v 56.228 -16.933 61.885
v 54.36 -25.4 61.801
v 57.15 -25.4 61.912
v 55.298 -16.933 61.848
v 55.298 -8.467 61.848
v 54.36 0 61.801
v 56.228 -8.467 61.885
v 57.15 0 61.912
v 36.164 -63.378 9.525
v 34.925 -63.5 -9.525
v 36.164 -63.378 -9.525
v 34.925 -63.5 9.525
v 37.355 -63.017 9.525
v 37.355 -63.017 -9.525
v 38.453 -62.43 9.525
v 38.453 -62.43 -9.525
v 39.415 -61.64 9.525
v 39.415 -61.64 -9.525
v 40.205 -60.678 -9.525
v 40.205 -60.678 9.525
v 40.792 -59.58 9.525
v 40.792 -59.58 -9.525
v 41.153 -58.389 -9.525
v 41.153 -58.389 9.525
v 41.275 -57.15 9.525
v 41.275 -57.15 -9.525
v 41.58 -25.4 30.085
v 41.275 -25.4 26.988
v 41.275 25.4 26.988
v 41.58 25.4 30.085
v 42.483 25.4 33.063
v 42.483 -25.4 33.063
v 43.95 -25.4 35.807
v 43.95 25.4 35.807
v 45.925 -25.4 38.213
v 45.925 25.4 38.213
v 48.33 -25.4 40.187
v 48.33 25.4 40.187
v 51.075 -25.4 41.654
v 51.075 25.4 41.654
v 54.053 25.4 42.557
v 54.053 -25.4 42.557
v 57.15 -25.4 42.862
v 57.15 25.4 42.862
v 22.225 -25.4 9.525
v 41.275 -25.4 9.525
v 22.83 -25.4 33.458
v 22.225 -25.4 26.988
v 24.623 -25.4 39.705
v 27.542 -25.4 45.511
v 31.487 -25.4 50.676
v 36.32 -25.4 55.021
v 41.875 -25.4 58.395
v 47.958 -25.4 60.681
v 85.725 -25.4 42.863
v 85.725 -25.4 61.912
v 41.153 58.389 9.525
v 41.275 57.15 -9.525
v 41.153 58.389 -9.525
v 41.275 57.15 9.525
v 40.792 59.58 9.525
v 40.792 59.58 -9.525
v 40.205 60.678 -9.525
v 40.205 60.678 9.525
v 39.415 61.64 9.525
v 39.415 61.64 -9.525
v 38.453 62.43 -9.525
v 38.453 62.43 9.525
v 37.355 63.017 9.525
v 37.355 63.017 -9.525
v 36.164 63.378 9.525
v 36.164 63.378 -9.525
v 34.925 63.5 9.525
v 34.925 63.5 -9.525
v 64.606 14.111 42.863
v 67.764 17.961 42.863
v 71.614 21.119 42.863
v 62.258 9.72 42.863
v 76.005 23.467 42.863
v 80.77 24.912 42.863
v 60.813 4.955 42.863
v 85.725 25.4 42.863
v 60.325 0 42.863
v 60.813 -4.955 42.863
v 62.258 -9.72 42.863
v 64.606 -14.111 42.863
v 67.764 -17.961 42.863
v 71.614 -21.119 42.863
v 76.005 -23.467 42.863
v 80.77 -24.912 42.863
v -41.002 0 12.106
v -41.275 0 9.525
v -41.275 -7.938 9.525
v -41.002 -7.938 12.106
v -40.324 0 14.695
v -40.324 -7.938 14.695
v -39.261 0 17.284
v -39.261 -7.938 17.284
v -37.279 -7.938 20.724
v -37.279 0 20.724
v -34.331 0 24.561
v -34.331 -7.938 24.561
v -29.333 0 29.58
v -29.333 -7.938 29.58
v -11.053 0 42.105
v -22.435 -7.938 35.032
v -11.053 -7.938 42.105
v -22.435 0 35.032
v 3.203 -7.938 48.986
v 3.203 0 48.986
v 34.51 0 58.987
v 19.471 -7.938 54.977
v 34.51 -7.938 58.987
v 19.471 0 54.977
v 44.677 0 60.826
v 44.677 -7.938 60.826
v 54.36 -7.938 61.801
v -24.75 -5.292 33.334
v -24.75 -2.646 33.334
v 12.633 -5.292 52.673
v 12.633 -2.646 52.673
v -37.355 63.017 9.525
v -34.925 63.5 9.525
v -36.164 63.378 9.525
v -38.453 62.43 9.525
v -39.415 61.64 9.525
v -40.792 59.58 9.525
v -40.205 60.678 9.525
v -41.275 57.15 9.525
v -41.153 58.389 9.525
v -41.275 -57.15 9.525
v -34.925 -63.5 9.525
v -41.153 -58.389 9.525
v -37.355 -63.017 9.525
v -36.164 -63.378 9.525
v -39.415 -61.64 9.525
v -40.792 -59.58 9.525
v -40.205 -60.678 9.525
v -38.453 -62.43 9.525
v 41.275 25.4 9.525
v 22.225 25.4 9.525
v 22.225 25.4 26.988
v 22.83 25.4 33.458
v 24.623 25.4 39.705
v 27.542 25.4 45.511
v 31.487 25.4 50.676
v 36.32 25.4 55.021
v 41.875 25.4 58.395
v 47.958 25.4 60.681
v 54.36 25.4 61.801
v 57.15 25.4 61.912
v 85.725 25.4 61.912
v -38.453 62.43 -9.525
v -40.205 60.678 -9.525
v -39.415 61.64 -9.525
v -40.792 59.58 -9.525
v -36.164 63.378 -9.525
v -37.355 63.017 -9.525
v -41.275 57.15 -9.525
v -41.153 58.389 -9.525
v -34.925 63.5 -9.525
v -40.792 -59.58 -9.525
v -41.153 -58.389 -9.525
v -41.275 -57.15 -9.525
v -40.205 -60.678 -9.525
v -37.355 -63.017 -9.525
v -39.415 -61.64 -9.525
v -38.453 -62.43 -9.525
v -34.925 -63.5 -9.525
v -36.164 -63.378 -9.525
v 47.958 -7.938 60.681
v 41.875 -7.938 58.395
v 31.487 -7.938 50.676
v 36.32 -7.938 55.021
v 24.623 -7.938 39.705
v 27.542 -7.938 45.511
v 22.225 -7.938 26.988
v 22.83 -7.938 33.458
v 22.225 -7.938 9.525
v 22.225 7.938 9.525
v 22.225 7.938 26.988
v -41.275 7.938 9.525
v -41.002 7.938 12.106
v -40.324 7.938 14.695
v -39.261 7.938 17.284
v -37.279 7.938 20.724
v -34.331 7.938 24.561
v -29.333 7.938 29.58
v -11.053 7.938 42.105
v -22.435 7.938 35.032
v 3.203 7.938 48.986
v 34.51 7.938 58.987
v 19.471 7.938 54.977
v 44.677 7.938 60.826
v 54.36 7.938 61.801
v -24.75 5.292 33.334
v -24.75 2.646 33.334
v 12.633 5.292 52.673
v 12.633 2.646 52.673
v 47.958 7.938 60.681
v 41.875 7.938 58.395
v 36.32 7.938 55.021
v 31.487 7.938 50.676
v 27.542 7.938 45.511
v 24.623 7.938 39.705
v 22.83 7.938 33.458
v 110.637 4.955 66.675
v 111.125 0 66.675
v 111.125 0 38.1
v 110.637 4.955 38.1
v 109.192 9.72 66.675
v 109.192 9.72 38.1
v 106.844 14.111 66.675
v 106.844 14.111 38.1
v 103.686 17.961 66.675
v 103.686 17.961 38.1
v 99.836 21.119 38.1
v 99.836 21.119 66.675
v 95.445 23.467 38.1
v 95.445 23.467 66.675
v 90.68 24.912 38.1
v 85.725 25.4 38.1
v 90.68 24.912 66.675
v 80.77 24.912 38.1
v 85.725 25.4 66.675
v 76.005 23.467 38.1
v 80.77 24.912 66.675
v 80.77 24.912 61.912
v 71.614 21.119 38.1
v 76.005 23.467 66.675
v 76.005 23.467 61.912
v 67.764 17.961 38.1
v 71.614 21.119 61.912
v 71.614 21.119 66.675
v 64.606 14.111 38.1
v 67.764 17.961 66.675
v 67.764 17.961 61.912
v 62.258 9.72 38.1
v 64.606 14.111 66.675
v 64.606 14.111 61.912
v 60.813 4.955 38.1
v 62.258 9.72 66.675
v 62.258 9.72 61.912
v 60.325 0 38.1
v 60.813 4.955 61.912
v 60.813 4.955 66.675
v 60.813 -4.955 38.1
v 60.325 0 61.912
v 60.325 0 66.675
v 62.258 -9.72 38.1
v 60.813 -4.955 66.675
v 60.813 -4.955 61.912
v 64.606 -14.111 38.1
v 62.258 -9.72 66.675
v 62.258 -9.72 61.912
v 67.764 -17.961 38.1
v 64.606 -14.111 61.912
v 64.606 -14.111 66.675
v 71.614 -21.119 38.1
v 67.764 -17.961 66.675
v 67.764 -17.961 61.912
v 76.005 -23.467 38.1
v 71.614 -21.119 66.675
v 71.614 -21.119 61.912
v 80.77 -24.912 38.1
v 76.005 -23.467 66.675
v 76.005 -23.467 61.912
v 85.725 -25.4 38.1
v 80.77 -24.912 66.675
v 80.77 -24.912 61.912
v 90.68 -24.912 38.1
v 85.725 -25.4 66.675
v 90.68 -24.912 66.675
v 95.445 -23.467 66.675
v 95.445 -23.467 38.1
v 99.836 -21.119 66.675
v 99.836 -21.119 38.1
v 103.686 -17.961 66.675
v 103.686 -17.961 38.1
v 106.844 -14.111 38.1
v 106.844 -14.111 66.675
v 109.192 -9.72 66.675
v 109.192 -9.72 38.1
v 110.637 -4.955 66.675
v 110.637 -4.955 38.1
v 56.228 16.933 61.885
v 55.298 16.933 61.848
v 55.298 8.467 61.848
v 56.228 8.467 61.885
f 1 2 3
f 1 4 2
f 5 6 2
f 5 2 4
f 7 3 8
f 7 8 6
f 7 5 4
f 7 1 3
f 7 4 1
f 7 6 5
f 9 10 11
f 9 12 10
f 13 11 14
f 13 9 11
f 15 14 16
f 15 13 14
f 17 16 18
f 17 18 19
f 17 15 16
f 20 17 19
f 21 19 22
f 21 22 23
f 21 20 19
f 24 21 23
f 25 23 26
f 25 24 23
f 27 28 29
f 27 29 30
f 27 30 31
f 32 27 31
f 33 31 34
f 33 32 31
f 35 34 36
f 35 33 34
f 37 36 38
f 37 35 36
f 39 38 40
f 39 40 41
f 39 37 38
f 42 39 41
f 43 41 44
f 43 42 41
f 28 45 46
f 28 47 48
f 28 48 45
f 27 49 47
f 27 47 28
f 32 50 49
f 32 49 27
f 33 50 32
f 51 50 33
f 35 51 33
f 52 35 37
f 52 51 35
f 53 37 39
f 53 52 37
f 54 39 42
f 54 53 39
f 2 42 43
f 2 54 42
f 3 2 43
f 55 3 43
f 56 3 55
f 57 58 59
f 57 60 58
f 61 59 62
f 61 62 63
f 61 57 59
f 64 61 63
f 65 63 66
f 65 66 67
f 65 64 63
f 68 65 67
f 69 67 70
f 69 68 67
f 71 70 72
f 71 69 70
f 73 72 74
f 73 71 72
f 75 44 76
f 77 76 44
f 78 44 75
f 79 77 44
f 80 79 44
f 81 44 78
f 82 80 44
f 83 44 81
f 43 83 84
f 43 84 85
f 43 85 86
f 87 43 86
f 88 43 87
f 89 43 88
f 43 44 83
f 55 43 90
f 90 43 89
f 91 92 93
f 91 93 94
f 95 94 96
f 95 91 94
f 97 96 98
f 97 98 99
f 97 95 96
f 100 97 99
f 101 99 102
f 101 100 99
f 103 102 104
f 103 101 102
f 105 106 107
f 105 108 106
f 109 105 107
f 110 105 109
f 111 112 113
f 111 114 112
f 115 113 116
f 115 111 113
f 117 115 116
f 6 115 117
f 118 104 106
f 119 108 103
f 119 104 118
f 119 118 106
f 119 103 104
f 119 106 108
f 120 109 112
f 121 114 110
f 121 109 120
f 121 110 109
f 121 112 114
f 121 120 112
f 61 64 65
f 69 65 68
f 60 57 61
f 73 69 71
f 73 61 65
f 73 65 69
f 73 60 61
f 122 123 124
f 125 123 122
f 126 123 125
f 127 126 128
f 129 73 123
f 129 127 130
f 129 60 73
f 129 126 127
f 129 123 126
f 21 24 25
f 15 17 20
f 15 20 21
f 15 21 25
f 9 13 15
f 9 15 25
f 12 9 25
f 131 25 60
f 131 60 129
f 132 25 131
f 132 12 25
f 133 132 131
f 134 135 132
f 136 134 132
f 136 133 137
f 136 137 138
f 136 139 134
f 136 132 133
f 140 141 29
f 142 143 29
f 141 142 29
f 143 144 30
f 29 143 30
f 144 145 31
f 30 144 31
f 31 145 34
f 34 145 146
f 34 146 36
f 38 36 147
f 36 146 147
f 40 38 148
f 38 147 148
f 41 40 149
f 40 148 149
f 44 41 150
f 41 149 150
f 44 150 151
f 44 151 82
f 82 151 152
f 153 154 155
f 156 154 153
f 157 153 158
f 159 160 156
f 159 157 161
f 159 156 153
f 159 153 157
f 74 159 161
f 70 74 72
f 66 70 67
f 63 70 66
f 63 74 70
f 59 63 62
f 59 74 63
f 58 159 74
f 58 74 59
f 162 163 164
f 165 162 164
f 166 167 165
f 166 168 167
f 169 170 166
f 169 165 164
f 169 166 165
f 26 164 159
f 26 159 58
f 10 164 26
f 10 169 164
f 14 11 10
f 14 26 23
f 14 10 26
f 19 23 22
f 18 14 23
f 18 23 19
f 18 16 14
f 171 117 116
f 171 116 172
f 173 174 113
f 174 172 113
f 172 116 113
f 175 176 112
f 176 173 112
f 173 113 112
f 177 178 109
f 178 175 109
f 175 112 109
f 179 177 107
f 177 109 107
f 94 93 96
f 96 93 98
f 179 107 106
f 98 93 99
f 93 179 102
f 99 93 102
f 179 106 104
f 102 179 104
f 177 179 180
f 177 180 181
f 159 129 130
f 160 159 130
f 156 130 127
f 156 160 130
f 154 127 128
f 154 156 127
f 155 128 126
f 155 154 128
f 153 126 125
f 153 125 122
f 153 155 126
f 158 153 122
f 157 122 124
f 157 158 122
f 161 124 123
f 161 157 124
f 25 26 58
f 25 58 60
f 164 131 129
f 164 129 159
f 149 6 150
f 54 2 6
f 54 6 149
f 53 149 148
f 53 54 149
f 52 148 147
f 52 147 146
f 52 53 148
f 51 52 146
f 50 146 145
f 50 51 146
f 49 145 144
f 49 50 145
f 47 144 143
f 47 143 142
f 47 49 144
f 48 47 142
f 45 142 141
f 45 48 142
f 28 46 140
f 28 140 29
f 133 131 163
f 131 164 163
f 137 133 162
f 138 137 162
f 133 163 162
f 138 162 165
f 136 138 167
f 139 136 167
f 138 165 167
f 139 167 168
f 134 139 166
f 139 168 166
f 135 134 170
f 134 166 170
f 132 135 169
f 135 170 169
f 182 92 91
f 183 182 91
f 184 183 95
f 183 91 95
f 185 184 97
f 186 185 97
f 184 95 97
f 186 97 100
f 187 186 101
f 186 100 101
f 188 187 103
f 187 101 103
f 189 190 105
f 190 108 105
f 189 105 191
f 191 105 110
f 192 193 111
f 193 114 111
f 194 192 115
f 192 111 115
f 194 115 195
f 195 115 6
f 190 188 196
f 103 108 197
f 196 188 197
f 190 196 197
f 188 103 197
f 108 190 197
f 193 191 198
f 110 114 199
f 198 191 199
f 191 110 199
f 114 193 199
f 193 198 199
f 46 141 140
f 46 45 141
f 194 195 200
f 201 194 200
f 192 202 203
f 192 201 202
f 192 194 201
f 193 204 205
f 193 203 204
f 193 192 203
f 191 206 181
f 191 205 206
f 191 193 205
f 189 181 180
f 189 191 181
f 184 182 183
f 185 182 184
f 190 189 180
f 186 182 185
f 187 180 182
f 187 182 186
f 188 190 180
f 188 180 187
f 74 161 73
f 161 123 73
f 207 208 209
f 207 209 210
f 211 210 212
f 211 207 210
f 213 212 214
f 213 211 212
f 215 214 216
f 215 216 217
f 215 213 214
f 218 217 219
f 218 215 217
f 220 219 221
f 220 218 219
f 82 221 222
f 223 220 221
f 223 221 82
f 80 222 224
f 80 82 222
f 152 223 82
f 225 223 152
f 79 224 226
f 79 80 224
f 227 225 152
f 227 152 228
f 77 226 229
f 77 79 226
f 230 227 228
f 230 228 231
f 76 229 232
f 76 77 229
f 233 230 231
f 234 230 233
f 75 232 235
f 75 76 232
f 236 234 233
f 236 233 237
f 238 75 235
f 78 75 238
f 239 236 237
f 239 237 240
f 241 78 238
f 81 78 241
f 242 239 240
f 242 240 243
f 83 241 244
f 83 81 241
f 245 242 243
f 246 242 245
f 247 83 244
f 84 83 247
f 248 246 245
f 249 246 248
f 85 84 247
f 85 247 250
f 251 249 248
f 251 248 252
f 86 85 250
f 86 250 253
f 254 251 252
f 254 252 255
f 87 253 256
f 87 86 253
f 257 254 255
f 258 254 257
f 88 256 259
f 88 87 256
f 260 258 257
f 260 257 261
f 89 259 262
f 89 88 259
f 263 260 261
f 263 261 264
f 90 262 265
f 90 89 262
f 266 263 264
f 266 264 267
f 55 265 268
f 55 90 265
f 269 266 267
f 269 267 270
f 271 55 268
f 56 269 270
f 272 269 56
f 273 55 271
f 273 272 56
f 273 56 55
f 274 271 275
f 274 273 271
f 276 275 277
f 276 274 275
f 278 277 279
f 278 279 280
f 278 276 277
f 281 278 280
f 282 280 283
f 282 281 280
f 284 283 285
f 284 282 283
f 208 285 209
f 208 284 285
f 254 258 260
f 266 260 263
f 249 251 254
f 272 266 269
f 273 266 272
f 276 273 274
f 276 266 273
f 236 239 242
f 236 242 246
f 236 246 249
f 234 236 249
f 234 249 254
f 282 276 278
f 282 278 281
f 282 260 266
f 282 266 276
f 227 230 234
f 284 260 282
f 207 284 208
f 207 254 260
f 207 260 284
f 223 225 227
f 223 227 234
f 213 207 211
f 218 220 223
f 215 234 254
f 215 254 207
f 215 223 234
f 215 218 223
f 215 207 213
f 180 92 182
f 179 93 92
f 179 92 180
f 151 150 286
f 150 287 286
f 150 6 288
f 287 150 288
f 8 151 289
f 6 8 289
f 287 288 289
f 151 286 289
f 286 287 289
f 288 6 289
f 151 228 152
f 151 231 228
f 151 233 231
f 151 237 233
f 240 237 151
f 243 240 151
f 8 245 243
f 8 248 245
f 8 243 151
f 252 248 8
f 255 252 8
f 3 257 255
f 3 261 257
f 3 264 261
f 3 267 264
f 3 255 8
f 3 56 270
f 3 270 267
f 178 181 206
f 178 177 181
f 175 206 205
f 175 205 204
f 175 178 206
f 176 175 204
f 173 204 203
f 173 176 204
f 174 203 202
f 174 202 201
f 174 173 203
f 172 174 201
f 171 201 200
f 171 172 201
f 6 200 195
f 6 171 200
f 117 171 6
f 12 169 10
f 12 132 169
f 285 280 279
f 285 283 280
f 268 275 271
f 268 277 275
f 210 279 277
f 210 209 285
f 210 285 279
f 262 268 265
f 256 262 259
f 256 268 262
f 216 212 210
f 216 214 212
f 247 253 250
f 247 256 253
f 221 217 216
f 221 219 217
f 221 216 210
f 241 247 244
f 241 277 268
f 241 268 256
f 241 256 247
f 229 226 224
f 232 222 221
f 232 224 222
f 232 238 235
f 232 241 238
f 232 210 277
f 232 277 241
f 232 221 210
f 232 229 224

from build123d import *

# Parameters (mm, degrees)
F1_DEPTH = 63.5
F0_W     = 25.4
F0_H     = 19.05
F2_DEPTH = 25.4
F3_DEPTH = 7.9375
F5_R     = 6.35


with BuildPart() as f1:
    # F0 (on Front) → F1 (new body, symmetric)
    with BuildSketch(Plane.XZ):
        Polygon((-41.275, -9.525), (41.275, -9.525), (41.275, 9.525), (22.225, 9.525), (-41.275, 9.525), align=None)
    extrude(amount=F1_DEPTH, both=True)

    # F5
    f5_edges = [f1.edges().sort_by_distance(p)[0] for p in [
        (41.275, -63.5, 0),
        (-41.275, -63.5, 0),
        (-41.275, 63.5, 0),
        (41.275, 63.5, 0),
    ]]
    fillet(f5_edges, radius=F5_R)


with BuildPart() as f2:
    # F0 (on Front) → F2 (new body, symmetric)
    with BuildSketch(Plane.XZ):
        with BuildLine():
            Line((22.225, 9.525), (41.275, 9.525))
            Line((41.275, 9.525), (41.275, 26.9875))
            ThreePointArc((41.275, 26.9875), (45.9246798487, 38.2128201513), (57.15, 42.8625))
            Line((57.15, 42.8625), (60.325, 42.8625))
            Line((60.325, 42.8625), (60.325, 61.9125))
            Line((60.325, 61.9125), (57.15, 61.9125))
            add(Edge.make_bspline(
                [(54.360118939, 61.8008909389), (55.3014145597, 61.8526008598), (56.2317398857, 61.8899307425), (57.15, 61.9125)],
                knots=[108.8305013681, 108.8305013681, 108.8305013681, 108.8305013681, 111.4985685166, 111.4985685166, 111.4985685166, 111.4985685166], degree=3))
            ThreePointArc((54.360118939, 61.8008909389), (31.4868725498, 50.6763056785), (22.225, 26.9875))
            Line((22.225, 26.9875), (22.225, 9.525))
        make_face()
        with Locations((73.025, 52.3875)):
            Rectangle(F0_W, F0_H)
    extrude(amount=F2_DEPTH, both=True)

    # F0 (on Front) → F4 (revolve)
    with BuildSketch(Plane.XZ):
        Polygon((85.725, 61.9125), (85.725, 42.8625), (85.725, 38.1), (111.125, 38.1), (111.125, 66.675), (85.725, 66.675), align=None)
    revolve(axis=Axis((85.725, 0, 52.3875), (0, 0, 1)))


with BuildPart() as f3:
    # F0 (on Front) → F3 (new body, symmetric)
    with BuildSketch(Plane.XZ):
        with BuildLine():
            add(Edge.make_bspline(
                [(-41.275, 9.525), (-40.6834626734, 33.6565211849), (15.9646556195, 59.6916424443), (54.360118939, 61.8008909389)],
                knots=[0, 0, 0, 0, 108.8305013681, 108.8305013681, 108.8305013681, 108.8305013681], degree=3))
            Line((-41.275, 9.525), (22.225, 9.525))
            Line((22.225, 9.525), (22.225, 26.9875))
            ThreePointArc((22.225, 26.9875), (31.4868725498, 50.6763056785), (54.360118939, 61.8008909389))
        make_face()
    extrude(amount=F3_DEPTH, both=True)


solid = Compound([f1.part, f2.part, f3.part])
